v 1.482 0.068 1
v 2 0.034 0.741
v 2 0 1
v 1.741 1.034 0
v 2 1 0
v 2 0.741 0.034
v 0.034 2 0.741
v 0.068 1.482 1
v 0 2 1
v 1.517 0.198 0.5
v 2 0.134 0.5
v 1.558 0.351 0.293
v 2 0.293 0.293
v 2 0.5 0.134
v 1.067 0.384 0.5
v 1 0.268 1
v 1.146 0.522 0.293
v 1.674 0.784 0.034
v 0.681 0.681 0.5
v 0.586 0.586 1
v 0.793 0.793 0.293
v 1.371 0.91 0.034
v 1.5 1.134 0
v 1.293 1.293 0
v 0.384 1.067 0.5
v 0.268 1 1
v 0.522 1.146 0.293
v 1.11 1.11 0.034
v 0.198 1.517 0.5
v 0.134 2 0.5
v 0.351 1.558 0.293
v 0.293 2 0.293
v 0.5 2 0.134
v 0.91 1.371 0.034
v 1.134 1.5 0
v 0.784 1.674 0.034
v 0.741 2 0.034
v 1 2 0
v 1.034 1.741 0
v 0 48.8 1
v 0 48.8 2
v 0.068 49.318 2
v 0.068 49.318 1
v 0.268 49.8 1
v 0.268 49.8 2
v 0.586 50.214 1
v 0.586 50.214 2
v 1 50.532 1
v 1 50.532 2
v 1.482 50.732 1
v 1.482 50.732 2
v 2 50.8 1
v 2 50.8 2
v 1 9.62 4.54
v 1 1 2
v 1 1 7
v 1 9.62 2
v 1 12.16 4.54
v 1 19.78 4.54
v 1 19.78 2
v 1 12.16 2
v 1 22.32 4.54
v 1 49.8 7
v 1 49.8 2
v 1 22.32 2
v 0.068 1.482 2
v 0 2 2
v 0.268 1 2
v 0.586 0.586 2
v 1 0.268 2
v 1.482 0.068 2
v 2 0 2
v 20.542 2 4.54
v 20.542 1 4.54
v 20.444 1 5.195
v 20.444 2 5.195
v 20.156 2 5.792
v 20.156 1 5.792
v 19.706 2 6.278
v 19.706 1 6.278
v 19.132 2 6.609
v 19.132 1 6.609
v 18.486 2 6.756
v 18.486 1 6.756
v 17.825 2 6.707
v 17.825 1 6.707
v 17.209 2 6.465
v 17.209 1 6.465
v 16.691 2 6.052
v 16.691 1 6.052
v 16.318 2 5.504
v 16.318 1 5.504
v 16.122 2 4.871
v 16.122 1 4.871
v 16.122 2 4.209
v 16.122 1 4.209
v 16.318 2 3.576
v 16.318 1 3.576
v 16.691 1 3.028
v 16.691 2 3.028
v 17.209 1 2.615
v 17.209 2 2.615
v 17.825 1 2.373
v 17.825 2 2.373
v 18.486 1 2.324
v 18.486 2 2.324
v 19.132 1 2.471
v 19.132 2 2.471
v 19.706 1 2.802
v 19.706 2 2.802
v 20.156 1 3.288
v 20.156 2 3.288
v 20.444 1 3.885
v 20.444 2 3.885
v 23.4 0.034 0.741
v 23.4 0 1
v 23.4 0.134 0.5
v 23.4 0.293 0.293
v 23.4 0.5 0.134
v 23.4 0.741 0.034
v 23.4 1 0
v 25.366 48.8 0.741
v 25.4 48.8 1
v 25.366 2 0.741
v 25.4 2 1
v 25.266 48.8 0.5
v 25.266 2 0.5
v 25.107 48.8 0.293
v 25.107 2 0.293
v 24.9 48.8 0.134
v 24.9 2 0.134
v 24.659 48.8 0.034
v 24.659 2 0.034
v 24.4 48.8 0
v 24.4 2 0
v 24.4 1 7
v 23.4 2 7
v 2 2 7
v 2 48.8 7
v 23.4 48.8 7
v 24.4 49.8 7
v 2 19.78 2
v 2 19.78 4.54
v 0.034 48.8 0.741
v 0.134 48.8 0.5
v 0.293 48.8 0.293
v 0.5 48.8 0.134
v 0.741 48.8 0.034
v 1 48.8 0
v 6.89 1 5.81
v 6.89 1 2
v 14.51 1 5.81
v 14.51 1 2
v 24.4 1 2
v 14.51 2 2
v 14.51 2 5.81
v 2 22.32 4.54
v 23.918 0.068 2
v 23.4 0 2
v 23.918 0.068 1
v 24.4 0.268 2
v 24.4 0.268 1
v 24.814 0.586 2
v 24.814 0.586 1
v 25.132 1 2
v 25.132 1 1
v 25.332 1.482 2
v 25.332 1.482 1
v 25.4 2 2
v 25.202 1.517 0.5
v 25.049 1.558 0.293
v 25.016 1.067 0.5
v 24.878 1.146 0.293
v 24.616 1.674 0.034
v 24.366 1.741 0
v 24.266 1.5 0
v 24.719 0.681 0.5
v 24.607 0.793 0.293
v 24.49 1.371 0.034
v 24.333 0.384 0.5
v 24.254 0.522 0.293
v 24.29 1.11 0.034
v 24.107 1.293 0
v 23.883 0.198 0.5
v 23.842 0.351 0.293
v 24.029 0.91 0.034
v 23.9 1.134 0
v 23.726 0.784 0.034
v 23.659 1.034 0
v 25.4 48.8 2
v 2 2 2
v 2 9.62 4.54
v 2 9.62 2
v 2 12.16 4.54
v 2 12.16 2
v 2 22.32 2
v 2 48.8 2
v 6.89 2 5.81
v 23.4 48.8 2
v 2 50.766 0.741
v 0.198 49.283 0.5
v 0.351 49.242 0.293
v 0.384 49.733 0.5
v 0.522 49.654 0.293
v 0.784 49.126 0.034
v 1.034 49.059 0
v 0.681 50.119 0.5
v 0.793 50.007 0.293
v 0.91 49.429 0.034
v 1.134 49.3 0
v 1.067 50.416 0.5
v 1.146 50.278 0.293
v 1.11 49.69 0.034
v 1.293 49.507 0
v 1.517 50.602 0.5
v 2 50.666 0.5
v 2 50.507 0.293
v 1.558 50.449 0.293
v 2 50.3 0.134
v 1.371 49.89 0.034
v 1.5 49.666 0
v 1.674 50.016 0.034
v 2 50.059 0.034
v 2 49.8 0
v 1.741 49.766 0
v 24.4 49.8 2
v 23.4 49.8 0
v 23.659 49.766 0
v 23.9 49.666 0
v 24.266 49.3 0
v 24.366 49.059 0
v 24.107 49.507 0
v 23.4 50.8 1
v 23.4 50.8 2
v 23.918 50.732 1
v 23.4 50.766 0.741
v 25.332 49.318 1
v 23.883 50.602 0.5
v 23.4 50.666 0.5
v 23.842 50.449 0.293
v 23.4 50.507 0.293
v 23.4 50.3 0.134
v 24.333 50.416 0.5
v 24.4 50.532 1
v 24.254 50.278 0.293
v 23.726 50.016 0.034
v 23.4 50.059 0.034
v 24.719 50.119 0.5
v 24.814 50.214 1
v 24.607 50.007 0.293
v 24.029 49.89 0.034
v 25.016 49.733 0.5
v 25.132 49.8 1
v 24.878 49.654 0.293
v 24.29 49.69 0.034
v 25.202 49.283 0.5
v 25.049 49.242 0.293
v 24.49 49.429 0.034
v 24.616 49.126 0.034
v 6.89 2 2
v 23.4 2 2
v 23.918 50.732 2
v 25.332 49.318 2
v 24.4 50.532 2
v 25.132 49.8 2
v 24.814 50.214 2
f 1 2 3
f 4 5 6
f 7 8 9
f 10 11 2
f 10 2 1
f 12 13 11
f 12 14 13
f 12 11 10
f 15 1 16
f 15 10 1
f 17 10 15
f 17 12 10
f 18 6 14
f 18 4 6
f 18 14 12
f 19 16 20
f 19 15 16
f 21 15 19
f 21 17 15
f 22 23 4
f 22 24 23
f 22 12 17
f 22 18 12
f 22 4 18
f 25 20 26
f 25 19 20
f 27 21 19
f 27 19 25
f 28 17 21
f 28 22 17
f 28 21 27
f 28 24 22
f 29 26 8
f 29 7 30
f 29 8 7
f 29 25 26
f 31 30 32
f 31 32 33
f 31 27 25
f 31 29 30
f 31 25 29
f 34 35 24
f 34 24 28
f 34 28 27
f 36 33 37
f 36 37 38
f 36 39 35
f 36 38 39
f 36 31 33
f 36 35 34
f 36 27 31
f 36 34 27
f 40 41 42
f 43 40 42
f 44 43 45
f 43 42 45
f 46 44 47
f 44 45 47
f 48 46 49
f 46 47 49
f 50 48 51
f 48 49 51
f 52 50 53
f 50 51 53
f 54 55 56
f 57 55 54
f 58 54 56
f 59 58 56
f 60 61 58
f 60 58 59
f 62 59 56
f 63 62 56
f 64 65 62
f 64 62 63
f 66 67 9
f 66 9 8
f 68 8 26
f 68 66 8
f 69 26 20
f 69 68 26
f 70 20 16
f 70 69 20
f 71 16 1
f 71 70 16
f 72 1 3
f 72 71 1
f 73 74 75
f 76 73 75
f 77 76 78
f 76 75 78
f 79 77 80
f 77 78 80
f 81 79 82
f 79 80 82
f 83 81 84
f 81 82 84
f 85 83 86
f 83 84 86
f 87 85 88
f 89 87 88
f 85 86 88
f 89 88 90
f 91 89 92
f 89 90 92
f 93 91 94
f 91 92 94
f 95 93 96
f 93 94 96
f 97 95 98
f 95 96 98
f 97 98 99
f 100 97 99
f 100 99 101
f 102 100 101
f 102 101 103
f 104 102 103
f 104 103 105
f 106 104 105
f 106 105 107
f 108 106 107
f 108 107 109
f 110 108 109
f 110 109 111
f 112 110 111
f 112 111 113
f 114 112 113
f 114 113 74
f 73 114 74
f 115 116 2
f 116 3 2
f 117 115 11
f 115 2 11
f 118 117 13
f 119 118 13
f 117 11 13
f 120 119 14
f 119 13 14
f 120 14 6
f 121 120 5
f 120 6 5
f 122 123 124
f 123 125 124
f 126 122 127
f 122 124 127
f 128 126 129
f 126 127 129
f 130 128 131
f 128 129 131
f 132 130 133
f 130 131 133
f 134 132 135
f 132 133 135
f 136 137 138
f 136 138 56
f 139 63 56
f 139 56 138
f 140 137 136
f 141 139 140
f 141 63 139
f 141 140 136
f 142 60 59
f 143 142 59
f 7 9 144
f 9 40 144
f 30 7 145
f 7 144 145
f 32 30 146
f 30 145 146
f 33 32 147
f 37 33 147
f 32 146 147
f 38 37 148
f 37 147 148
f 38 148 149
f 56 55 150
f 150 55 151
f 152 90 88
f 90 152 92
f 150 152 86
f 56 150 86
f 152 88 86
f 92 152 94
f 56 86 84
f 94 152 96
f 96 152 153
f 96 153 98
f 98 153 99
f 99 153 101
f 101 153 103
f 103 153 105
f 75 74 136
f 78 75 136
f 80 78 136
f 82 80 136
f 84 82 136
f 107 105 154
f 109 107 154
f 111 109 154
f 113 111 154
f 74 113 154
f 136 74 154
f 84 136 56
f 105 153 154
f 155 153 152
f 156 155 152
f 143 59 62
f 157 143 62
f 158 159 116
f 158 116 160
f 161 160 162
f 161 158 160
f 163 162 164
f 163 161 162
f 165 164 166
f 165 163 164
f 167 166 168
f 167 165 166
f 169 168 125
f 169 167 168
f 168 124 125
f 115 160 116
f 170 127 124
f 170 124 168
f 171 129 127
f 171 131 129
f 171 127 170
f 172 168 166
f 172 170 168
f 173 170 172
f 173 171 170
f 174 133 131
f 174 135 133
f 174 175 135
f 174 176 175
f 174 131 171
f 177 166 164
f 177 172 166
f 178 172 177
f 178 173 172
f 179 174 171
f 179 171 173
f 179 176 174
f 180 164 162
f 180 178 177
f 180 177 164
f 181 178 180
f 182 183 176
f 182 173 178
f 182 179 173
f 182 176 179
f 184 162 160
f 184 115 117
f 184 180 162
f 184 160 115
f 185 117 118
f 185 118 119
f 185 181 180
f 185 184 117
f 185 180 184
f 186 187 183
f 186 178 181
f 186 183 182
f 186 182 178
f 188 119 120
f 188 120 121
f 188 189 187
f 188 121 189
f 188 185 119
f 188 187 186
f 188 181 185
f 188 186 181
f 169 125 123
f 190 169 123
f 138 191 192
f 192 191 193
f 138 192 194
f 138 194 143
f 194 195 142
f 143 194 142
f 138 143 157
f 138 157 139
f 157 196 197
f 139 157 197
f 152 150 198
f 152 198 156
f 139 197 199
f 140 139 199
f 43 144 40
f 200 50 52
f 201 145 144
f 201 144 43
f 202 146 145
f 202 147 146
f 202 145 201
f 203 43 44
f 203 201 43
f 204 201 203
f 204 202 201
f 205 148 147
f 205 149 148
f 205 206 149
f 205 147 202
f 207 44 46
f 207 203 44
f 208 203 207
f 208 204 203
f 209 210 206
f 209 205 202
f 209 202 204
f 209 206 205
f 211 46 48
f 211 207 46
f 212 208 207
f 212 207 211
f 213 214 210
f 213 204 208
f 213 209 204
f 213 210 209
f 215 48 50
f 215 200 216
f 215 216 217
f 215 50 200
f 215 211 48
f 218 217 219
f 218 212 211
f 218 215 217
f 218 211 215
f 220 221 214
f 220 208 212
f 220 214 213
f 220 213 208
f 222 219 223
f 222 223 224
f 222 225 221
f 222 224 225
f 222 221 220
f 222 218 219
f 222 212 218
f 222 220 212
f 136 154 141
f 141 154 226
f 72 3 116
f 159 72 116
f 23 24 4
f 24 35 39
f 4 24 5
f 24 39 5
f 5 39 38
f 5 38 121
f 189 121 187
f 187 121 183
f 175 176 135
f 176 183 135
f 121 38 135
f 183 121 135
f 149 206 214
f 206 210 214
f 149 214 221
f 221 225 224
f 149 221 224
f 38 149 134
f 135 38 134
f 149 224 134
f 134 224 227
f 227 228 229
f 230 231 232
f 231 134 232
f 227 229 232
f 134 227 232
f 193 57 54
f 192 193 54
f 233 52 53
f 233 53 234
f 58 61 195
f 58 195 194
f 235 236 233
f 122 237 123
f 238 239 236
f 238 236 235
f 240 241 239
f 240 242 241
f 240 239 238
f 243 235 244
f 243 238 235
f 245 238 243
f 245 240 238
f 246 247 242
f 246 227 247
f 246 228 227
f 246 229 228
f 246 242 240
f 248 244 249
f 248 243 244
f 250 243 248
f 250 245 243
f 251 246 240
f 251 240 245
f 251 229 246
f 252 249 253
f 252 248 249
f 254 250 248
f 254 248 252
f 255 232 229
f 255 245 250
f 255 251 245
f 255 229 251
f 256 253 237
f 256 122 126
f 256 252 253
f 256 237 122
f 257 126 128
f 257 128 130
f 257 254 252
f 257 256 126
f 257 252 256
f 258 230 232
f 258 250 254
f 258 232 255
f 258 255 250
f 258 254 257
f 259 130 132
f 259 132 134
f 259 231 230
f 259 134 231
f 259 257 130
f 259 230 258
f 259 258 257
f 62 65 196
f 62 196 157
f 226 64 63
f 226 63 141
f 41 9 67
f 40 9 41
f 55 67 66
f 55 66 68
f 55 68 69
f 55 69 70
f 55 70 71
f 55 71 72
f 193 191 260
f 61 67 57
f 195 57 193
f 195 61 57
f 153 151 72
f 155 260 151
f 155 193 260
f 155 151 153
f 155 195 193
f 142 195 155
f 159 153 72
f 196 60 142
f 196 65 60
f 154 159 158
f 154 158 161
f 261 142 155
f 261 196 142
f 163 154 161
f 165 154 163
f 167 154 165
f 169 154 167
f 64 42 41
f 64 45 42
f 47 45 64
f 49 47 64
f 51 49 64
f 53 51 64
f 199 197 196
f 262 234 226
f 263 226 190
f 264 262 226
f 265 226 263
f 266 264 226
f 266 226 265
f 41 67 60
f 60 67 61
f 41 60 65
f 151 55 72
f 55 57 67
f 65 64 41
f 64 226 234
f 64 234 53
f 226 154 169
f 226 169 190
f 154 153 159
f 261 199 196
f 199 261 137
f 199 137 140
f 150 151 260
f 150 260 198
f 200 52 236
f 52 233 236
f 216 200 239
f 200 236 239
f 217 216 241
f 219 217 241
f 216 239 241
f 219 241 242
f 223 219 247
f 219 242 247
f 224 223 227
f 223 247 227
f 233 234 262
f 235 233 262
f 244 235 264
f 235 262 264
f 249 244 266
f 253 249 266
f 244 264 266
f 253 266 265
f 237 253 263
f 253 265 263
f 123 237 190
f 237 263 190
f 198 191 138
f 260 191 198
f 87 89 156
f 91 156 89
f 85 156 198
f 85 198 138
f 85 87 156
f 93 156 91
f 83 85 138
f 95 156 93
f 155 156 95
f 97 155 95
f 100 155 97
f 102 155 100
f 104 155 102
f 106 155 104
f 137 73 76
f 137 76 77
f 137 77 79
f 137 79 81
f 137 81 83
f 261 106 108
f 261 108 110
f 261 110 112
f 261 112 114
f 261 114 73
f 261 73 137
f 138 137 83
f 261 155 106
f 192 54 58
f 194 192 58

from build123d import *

# Parameters (mm, degrees)
SKETCH2_W           = 25.4
SKETCH2_H           = 50.8
BOSS_EXTRUDE1_DEPTH = 2.00000108
SKETCH3_W           = 23.39999892
SKETCH3_H           = 48.79999892
SKETCH3_W_2         = 21.39999784
SKETCH3_H_2         = 46.79999784
BOSS_EXTRUDE2_DEPTH = 4.999999906
FILLET1_R           = 2.000000064
FILLET2_R           = 1.000000032
CUT_EXTRUDE2_REACH  = 51.8
SKETCH5_R           = 2.2225
CUT_EXTRUDE3_REACH  = 51.8
SKETCH6_W           = 7.62
SKETCH6_H           = 3.81
CUT_EXTRUDE4_REACH  = 26.4
SKETCH7_W           = 2.54
SKETCH7_H           = 2.54


with BuildPart() as part:
    # Sketch2 → Boss-Extrude1 (new body)
    with BuildSketch(Plane.XY):
        with Locations((12.7, 25.4)):
            Rectangle(SKETCH2_W, SKETCH2_H)
    extrude(amount=BOSS_EXTRUDE1_DEPTH)

    # Sketch3 → Boss-Extrude2 (add)
    with BuildSketch(Plane.XY.offset(2.00000108)):
        with Locations((12.7, 25.4)):
            Rectangle(SKETCH3_W, SKETCH3_H)
        with Locations((12.7, 25.4)):
            Rectangle(SKETCH3_W_2, SKETCH3_H_2, mode=Mode.SUBTRACT)
    extrude(amount=BOSS_EXTRUDE2_DEPTH)

    # Fillet1
    fillet1_edges = [part.edges().sort_by_distance(p)[0] for p in [
        (0, 50.8, 1.00000054),
        (25.4, 50.8, 1.00000054),
        (25.4, 0, 1.00000054),
        (0, 0, 1.00000054),
    ]]
    fillet(fillet1_edges, radius=FILLET1_R)

    # Fillet2
    fillet2_edges = [part.edges().sort_by_distance(p)[0] for p in [
        (0, 25.4, 0),
        (12.7, 50.8, 0),
        (25.4, 25.4, 0),
        (12.7, 0, 0),
        (24.814213544, 50.214213544, 0),
        (24.814213544, 0.585786456, 0),
        (0.585786456, 0.585786456, 0),
        (0.585786456, 50.214213544, 0),
    ]]
    fillet(fillet2_edges, radius=FILLET2_R)

    # Sketch5 → Cut-Extrude2 (cut, up to next)
    with BuildSketch(Plane.XZ.offset(-1.00000054), mode=Mode.PRIVATE) as cut_extrude2_sk1:
        with Locations((18.319999936, 4.54000108)):
            Circle(SKETCH5_R)
    cut_extrude2_tool1 = extrude(cut_extrude2_sk1.sketch, amount=-CUT_EXTRUDE2_REACH, mode=Mode.PRIVATE) & part.part
    add(cut_extrude2_tool1.solids().sort_by_distance((18.32, 1.000001, 4.540001))[0], mode=Mode.SUBTRACT)

    # Sketch6 → Cut-Extrude3 (cut, up to next)
    with BuildSketch(Plane.XZ.offset(-1.00000054), mode=Mode.PRIVATE) as cut_extrude3_sk1:
        with Locations((10.699999936, 3.90500108)):
            Rectangle(SKETCH6_W, SKETCH6_H)
    cut_extrude3_tool1 = extrude(cut_extrude3_sk1.sketch, amount=-CUT_EXTRUDE3_REACH, mode=Mode.PRIVATE) & part.part
    add(cut_extrude3_tool1.solids().sort_by_distance((10.7, 1.000001, 3.905001))[0], mode=Mode.SUBTRACT)

    # Sketch7 → Cut-Extrude4 (cut, up to next)
    with BuildSketch(Plane.ZY.offset(-1.00000054), mode=Mode.PRIVATE) as cut_extrude4_sk1:
        with Locations((3.27000108, 10.890000064)):
            Rectangle(SKETCH7_W, SKETCH7_H)
    cut_extrude4_tool1 = extrude(cut_extrude4_sk1.sketch, amount=-CUT_EXTRUDE4_REACH, mode=Mode.PRIVATE) & part.part
    add(cut_extrude4_tool1.solids().sort_by_distance((1.000001, 10.89, 3.270001))[0], mode=Mode.SUBTRACT)
    # Sketch7 → Cut-Extrude4 (cut, up to next)
    with BuildSketch(Plane.ZY.offset(-1.00000054), mode=Mode.PRIVATE) as cut_extrude4_sk2:
        with Locations((3.27000108, 21.050000064)):
            Rectangle(SKETCH7_W, SKETCH7_H)
    cut_extrude4_tool2 = extrude(cut_extrude4_sk2.sketch, amount=-CUT_EXTRUDE4_REACH, mode=Mode.PRIVATE) & part.part
    add(cut_extrude4_tool2.solids().sort_by_distance((1.000001, 21.05, 3.270001))[0], mode=Mode.SUBTRACT)


solid = part.part
